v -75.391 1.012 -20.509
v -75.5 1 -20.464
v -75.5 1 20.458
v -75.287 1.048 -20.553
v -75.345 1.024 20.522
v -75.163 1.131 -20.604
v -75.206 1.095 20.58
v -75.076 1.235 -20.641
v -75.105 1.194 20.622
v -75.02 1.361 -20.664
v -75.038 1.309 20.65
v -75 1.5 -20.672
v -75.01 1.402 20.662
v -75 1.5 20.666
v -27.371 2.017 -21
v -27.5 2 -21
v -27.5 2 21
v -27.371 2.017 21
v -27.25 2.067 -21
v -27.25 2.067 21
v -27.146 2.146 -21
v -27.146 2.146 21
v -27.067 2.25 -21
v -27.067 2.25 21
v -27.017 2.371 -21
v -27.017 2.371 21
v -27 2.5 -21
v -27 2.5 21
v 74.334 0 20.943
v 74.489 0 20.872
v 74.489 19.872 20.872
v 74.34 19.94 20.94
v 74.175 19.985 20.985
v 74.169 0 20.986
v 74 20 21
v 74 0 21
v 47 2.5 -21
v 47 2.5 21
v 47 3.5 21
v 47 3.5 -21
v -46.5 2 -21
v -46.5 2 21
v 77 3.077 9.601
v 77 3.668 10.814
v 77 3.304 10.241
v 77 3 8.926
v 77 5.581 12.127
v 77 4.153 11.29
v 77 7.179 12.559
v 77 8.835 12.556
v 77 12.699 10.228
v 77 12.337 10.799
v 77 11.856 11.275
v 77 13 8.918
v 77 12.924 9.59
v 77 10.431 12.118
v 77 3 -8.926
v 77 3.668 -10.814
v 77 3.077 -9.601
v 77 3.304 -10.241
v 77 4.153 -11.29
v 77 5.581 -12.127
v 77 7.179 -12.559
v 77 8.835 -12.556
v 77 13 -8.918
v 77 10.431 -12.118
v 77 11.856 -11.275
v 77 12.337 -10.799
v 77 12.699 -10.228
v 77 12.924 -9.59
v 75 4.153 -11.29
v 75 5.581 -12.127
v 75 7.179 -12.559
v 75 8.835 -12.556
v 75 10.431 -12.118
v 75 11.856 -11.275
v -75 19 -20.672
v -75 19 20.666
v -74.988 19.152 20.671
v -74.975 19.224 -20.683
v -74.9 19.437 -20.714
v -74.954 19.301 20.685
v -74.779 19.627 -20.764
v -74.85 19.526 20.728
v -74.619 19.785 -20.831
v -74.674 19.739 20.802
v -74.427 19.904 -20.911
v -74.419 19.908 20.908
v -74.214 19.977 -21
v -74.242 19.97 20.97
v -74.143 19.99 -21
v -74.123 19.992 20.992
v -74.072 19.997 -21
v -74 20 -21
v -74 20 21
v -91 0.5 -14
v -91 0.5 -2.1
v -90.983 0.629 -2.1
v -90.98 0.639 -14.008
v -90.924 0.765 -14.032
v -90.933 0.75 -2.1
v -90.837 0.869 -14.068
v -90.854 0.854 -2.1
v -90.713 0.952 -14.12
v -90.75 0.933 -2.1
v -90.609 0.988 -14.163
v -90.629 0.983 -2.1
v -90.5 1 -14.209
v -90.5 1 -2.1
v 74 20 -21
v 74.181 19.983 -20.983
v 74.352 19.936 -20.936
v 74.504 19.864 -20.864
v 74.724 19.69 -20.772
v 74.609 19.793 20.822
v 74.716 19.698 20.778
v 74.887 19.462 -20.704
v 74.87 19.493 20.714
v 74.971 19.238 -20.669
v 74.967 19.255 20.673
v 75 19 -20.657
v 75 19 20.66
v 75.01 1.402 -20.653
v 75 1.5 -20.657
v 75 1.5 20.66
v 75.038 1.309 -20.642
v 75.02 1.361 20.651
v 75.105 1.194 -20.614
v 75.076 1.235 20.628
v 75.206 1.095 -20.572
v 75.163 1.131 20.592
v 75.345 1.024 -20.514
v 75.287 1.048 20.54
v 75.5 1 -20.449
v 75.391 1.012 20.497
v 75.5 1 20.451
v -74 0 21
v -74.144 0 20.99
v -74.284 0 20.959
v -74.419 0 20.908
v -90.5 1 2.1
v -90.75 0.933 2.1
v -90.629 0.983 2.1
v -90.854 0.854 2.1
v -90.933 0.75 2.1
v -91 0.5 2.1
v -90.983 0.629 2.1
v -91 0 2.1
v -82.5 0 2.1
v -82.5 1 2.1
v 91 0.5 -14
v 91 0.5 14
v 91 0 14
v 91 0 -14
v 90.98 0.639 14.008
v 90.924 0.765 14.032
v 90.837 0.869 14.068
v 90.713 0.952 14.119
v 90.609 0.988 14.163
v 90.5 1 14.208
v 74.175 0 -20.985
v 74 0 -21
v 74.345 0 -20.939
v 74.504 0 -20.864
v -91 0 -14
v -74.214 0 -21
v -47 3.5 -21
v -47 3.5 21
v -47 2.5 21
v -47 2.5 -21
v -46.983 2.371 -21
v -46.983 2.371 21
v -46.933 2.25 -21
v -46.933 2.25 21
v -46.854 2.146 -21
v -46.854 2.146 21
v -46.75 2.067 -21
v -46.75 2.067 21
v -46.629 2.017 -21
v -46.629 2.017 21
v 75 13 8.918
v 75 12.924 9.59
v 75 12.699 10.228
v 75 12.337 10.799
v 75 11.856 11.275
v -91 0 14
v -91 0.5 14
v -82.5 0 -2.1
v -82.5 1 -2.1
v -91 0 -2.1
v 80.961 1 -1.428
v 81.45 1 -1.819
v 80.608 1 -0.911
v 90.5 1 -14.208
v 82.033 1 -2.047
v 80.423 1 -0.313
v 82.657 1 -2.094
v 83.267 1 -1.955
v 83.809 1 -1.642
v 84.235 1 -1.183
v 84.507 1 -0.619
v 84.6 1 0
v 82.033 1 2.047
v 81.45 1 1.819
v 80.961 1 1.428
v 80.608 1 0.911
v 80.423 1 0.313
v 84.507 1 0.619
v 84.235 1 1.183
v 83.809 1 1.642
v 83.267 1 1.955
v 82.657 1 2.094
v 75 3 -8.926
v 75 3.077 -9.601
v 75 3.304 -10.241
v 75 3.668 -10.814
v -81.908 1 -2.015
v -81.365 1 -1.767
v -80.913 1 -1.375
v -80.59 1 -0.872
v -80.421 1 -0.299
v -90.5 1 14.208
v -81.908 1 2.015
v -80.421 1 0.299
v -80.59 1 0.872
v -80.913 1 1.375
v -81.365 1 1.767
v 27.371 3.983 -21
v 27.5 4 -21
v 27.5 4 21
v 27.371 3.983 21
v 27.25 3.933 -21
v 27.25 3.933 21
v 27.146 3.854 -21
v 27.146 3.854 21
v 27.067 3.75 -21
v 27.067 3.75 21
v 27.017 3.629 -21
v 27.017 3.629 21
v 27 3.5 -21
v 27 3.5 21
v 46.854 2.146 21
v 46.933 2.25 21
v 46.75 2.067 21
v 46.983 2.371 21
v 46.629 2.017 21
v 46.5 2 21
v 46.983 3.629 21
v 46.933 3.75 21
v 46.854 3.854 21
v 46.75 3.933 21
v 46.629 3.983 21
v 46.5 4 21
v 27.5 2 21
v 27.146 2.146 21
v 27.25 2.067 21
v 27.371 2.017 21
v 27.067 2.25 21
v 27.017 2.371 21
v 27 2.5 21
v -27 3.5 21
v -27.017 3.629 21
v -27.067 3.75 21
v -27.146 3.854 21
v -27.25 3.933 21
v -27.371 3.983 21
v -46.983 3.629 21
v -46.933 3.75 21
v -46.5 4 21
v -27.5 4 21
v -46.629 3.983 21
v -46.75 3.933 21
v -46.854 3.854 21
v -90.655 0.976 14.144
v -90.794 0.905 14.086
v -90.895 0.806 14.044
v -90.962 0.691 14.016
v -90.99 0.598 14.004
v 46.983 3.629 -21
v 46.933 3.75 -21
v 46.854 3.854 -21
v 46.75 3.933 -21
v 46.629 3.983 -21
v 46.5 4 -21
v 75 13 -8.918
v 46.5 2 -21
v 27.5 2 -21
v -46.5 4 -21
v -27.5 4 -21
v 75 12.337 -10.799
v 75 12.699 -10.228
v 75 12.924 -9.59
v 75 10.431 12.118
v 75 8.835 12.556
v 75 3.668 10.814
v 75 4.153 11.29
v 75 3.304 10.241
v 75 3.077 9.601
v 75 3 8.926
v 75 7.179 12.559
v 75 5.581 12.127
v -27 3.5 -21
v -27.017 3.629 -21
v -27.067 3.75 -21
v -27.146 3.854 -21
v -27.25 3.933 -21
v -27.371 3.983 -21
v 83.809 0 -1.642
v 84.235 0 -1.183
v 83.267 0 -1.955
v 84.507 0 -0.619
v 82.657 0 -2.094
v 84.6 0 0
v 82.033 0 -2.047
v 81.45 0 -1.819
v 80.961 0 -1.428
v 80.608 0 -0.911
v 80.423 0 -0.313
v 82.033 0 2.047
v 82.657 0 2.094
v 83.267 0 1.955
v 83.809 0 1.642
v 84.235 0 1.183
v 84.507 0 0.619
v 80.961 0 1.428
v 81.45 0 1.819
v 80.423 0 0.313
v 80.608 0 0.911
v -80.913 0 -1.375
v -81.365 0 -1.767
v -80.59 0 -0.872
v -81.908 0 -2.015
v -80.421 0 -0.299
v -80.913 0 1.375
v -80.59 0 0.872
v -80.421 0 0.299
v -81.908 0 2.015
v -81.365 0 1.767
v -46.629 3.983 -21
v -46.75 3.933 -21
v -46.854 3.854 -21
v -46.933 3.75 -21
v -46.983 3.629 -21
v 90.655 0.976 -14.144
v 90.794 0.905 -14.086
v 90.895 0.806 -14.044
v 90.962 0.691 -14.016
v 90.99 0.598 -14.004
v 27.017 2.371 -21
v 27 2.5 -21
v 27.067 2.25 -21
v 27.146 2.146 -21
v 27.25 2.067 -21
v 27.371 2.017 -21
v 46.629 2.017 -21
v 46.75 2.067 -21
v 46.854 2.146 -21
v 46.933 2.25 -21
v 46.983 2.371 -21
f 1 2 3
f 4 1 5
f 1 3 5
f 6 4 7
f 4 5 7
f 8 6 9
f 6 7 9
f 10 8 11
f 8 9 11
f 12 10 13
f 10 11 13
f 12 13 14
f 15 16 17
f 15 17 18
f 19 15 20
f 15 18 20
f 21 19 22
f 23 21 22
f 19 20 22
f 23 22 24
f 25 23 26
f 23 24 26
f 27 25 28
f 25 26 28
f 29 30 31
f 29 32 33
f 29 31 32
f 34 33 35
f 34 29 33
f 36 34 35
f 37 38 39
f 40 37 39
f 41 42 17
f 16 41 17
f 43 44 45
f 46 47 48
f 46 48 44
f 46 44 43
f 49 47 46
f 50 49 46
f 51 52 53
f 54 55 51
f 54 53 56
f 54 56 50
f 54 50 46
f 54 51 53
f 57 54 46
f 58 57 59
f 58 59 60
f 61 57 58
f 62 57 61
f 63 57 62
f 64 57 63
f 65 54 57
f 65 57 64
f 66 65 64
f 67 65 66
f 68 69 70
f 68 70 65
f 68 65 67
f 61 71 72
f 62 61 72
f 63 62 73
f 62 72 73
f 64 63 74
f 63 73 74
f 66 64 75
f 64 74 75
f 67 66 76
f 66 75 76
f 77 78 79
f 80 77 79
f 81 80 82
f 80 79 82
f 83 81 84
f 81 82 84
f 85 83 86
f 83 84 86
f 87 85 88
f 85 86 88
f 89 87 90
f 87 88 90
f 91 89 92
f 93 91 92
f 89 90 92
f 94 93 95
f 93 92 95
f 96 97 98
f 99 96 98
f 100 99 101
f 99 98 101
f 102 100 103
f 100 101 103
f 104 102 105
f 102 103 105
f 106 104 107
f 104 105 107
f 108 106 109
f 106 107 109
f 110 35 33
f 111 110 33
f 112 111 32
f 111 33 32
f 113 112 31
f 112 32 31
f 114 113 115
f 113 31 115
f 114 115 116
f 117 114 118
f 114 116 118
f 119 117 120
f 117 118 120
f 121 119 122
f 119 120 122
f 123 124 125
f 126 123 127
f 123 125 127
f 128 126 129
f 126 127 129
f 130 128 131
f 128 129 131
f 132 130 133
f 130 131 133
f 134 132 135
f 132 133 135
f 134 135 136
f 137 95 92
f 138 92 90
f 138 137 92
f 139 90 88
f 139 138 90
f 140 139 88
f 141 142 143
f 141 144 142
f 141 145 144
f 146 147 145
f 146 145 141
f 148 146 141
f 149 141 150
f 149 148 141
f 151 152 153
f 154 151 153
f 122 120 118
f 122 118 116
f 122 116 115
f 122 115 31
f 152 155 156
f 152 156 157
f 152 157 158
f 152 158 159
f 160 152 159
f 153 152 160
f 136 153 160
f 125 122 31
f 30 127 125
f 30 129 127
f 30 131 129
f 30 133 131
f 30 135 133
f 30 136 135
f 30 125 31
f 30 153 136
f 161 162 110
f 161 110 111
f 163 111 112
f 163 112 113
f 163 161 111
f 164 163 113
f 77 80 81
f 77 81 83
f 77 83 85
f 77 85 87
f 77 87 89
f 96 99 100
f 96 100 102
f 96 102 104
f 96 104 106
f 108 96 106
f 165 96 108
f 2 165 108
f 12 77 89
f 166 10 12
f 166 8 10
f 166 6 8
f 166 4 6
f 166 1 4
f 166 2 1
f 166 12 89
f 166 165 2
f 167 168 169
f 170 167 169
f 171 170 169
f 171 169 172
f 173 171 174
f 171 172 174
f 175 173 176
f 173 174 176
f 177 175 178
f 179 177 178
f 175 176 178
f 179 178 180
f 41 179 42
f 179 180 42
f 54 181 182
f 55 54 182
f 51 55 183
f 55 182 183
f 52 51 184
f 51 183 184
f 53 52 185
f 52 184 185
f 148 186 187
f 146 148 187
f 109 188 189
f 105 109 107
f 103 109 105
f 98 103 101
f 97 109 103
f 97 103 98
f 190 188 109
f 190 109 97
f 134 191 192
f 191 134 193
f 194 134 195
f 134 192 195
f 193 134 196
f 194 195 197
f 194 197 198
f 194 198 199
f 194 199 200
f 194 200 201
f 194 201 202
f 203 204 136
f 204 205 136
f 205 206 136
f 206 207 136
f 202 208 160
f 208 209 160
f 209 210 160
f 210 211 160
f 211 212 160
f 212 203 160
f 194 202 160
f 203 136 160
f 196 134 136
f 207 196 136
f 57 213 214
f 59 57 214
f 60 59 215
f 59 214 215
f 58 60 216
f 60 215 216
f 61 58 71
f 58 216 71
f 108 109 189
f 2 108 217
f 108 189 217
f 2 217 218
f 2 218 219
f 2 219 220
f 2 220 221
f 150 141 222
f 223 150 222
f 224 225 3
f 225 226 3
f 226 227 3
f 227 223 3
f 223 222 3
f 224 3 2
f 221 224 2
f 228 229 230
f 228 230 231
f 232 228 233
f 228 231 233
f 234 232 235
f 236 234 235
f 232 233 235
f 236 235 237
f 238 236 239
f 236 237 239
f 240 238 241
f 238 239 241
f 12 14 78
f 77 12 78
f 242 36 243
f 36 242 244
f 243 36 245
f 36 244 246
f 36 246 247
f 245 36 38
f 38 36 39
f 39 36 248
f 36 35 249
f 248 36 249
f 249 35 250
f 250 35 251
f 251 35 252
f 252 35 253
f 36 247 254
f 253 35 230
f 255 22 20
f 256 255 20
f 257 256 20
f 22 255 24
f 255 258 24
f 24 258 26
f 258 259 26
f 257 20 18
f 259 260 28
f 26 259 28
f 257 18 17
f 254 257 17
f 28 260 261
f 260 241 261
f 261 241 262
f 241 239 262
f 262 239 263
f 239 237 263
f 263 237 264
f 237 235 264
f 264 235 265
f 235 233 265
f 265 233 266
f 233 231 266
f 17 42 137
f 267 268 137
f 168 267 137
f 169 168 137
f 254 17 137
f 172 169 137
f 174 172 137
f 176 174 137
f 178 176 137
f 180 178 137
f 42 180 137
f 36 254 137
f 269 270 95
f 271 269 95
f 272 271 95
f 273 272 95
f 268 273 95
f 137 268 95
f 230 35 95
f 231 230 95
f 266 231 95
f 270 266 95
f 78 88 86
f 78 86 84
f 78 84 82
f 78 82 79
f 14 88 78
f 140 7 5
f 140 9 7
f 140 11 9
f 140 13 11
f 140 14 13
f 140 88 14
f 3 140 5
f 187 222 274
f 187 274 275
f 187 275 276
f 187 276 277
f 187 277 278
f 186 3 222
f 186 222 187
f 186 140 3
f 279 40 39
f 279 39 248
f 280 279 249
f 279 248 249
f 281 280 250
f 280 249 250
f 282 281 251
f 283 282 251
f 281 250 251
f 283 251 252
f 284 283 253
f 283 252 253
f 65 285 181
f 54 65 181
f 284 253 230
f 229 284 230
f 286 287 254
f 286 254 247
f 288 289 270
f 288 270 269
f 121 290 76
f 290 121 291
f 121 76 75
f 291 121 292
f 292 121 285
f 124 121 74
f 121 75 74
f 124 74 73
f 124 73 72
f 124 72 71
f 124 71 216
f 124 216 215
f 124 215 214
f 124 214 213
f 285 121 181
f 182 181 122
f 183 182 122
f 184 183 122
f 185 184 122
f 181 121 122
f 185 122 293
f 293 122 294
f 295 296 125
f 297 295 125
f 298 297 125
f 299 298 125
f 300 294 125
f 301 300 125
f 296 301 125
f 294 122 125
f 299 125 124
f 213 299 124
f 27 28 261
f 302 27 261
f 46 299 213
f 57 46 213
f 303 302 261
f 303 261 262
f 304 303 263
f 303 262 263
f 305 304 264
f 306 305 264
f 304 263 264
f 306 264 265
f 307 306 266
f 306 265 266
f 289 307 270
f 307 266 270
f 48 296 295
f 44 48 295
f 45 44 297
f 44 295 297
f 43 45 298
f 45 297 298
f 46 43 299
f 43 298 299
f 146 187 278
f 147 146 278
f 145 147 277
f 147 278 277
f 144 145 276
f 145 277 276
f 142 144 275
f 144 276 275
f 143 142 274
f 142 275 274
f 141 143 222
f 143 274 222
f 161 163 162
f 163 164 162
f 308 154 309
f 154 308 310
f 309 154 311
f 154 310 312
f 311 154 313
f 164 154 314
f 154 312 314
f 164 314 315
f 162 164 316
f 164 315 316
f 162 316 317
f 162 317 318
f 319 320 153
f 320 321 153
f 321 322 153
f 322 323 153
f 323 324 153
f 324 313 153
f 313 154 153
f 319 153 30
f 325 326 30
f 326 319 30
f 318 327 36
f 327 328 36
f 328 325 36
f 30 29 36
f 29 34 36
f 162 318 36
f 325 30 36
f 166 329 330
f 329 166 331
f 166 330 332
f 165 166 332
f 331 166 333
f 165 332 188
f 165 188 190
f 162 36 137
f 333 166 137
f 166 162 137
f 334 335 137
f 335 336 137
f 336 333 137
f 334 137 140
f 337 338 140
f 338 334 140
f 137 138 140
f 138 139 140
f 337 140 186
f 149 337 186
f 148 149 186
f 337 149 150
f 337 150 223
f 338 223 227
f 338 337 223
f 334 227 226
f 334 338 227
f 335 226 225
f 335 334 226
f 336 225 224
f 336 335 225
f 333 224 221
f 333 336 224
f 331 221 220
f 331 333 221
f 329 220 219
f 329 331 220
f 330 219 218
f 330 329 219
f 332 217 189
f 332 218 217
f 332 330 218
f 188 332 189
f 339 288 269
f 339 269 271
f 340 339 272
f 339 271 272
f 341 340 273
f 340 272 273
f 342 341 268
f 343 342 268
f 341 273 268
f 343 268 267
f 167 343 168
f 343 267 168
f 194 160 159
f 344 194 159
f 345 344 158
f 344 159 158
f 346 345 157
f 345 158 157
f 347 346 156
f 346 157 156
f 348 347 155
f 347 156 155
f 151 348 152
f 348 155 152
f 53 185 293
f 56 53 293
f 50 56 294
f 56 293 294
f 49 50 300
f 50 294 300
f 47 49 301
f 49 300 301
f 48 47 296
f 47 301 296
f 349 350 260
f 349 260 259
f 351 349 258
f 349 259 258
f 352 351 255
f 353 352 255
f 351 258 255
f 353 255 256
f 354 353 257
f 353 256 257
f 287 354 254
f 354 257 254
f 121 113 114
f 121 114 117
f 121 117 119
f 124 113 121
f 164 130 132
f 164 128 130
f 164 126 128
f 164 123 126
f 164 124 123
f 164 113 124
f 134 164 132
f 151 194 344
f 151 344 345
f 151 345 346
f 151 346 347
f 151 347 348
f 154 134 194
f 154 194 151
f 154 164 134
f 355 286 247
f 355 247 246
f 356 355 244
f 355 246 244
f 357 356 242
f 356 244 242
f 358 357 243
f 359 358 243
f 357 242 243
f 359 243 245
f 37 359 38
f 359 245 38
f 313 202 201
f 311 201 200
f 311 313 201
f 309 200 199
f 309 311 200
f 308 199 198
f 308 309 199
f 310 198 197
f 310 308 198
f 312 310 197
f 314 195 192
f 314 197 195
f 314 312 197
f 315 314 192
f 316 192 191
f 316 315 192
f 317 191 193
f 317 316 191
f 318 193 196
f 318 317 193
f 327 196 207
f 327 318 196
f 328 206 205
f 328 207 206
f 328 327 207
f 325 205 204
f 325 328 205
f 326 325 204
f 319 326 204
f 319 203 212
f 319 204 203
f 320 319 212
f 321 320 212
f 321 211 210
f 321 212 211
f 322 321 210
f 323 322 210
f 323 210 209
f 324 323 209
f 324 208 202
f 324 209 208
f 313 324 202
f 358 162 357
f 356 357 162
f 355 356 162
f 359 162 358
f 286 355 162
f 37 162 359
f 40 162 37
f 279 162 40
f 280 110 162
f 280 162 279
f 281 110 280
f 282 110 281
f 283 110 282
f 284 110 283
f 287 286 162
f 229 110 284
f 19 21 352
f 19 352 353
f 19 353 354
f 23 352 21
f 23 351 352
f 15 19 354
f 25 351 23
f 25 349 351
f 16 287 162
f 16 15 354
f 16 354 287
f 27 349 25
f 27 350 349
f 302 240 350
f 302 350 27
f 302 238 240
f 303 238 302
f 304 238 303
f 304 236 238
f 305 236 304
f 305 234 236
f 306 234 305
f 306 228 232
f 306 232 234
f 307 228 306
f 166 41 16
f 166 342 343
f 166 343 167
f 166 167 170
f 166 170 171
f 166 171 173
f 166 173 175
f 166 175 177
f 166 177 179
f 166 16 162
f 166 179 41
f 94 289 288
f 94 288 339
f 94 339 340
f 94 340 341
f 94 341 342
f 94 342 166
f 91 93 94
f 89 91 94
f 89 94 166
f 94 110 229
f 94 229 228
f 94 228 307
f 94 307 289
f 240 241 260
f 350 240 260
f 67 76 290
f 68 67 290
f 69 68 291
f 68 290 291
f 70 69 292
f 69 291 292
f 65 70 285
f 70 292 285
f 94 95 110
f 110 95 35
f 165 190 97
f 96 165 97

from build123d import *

# Parameters (mm, degrees)
EXTRUDE_START           = 21
EXTRUDE_1_DEPTH         = 42
CUT_EXTRUDE_4_OUTLINE_R = 2.1
CUT_EXTRUDE_4_DEPTH     = 20
EXTRUDE_2_DEPTH         = 2


# Read off the part's stored shape, not the designer's step: ｶｯﾄ - 押し出し4
with BuildPart() as part:
    # ｽｹｯﾁ2 → ﾎﾞｽ - 押し出し1 (new body)
    with BuildSketch(Plane.XY.offset(EXTRUDE_START)):
        with BuildLine():
            ThreePointArc((-75.5, 1), (-75.146446609, 1.146446609), (-75, 1.5))
            Line((-75, 1.5), (-75, 19))
            ThreePointArc((-75, 19), (-74.707106781, 19.707106781), (-74, 20))
            Line((-74, 20), (74, 20))
            ThreePointArc((74, 20), (74.707106781, 19.707106781), (75, 19))
            Line((75, 19), (75, 1.5))
            ThreePointArc((75, 1.5), (75.146446609, 1.146446609), (75.5, 1))
            Line((75.5, 1), (90.5, 1))
            ThreePointArc((90.5, 1), (90.853553391, 0.853553391), (91, 0.5))
            Line((91, 0.5), (91, 0))
            Line((91, 0), (-91, 0))
            Line((-91, 0), (-91, 0.5))
            ThreePointArc((-91, 0.5), (-90.853553391, 0.853553391), (-90.5, 1))
            Line((-90.5, 1), (-75.5, 1))
        make_face()
        with BuildLine():
            ThreePointArc((-27.5, 2), (-27.146446609, 2.146446609), (-27, 2.5))
            Line((-27, 2.5), (-27, 3.5))
            ThreePointArc((-27, 3.5), (-27.146446609, 3.853553391), (-27.5, 4))
            Line((-27.5, 4), (-46.5, 4))
            ThreePointArc((-46.5, 4), (-46.853553391, 3.853553391), (-47, 3.5))
            Line((-47, 3.5), (-47, 2.5))
            ThreePointArc((-47, 2.5), (-46.853553391, 2.146446609), (-46.5, 2))
            Line((-46.5, 2), (-27.5, 2))
        make_face(mode=Mode.SUBTRACT)
        with BuildLine():
            ThreePointArc((27, 2.5), (27.146446609, 2.146446609), (27.5, 2))
            Line((27.5, 2), (46.5, 2))
            ThreePointArc((46.5, 2), (46.853553391, 2.146446609), (47, 2.5))
            Line((47, 2.5), (47, 3.5))
            ThreePointArc((47, 3.5), (46.853553391, 3.853553391), (46.5, 4))
            Line((46.5, 4), (27.5, 4))
            ThreePointArc((27.5, 4), (27.146446609, 3.853553391), (27, 3.5))
            Line((27, 3.5), (27, 2.5))
        make_face(mode=Mode.SUBTRACT)
    extrude(amount=-EXTRUDE_1_DEPTH)

    # ｶｯﾄ - 押し出し4 outline → ｶｯﾄ - 押し出し4 (cut)
    with BuildSketch(Plane(origin=(0, 0, 0), x_dir=(1, 0, 0), z_dir=(0, 1, 0))):
        with BuildLine():
            ThreePointArc((-74, -21), (-74.214440627, -20.976737026), (-74.418904201, -20.908030435))
            Line((-74.418904201, -20.908030435), (-91, -14))
            Line((-91, -14), (-91, -21))
            Line((-91, -21), (-74, -21))
        make_face()
        with BuildLine():
            ThreePointArc((74.488899944, -20.872339868), (74.252646128, -20.96755875), (74, -21))
            Line((74, -21), (91, -21))
            Line((91, -21), (91, -14))
            Line((91, -14), (74.488899944, -20.872339868))
        make_face()
        Polygon((-74.21393, 21), (-91, 21), (-91, 14), align=None)
        with BuildLine():
            Line((-91, 2.1), (-91, -2.1))
            Line((-91, -2.1), (-82.5, -2.1))
            ThreePointArc((-82.5, -2.1), (-80.4, 0), (-82.5, 2.1))
            Line((-82.5, 2.1), (-91, 2.1))
        make_face()
        with BuildLine():
            Line((91, 21), (74, 21))
            ThreePointArc((74, 21), (74.260916595, 20.965361347), (74.503757591, 20.863845061))
            Line((74.503757591, 20.863845061), (91, 14))
            Line((91, 14), (91, 21))
        make_face()
        with Locations((82.5, 0)):
            Circle(CUT_EXTRUDE_4_OUTLINE_R)
    extrude(amount=CUT_EXTRUDE_4_DEPTH, mode=Mode.SUBTRACT)

    # ｽｹｯﾁ5 → ﾎﾞｽ - 押し出し2 (add)
    with BuildSketch(Plane(origin=(75, 0, 0), x_dir=(0, 0, -1), z_dir=(1, 0, 0))):
        with BuildLine():
            Line((-8.925734, 3), (8.925734, 3))
            ThreePointArc((8.925734, 3), (10.240738094, 3.303564532), (11.289616453, 4.152823844))
            ThreePointArc((11.289616453, 4.152823844), (12.612818852, 8.006934379), (11.275142981, 11.856045429))
            ThreePointArc((11.275142981, 11.856045429), (10.228153822, 12.698901284), (8.918218, 13))
            Line((8.918218, 13), (-8.918218, 13))
            ThreePointArc((-8.918218, 13), (-10.228153822, 12.698901284), (-11.275142981, 11.856045429))
            ThreePointArc((-11.275142981, 11.856045429), (-12.612818852, 8.006934379), (-11.289616453, 4.152823844))
            ThreePointArc((-11.289616453, 4.152823844), (-10.240738094, 3.303564532), (-8.925734, 3))
        make_face()
    extrude(amount=EXTRUDE_2_DEPTH)


solid = part.part
